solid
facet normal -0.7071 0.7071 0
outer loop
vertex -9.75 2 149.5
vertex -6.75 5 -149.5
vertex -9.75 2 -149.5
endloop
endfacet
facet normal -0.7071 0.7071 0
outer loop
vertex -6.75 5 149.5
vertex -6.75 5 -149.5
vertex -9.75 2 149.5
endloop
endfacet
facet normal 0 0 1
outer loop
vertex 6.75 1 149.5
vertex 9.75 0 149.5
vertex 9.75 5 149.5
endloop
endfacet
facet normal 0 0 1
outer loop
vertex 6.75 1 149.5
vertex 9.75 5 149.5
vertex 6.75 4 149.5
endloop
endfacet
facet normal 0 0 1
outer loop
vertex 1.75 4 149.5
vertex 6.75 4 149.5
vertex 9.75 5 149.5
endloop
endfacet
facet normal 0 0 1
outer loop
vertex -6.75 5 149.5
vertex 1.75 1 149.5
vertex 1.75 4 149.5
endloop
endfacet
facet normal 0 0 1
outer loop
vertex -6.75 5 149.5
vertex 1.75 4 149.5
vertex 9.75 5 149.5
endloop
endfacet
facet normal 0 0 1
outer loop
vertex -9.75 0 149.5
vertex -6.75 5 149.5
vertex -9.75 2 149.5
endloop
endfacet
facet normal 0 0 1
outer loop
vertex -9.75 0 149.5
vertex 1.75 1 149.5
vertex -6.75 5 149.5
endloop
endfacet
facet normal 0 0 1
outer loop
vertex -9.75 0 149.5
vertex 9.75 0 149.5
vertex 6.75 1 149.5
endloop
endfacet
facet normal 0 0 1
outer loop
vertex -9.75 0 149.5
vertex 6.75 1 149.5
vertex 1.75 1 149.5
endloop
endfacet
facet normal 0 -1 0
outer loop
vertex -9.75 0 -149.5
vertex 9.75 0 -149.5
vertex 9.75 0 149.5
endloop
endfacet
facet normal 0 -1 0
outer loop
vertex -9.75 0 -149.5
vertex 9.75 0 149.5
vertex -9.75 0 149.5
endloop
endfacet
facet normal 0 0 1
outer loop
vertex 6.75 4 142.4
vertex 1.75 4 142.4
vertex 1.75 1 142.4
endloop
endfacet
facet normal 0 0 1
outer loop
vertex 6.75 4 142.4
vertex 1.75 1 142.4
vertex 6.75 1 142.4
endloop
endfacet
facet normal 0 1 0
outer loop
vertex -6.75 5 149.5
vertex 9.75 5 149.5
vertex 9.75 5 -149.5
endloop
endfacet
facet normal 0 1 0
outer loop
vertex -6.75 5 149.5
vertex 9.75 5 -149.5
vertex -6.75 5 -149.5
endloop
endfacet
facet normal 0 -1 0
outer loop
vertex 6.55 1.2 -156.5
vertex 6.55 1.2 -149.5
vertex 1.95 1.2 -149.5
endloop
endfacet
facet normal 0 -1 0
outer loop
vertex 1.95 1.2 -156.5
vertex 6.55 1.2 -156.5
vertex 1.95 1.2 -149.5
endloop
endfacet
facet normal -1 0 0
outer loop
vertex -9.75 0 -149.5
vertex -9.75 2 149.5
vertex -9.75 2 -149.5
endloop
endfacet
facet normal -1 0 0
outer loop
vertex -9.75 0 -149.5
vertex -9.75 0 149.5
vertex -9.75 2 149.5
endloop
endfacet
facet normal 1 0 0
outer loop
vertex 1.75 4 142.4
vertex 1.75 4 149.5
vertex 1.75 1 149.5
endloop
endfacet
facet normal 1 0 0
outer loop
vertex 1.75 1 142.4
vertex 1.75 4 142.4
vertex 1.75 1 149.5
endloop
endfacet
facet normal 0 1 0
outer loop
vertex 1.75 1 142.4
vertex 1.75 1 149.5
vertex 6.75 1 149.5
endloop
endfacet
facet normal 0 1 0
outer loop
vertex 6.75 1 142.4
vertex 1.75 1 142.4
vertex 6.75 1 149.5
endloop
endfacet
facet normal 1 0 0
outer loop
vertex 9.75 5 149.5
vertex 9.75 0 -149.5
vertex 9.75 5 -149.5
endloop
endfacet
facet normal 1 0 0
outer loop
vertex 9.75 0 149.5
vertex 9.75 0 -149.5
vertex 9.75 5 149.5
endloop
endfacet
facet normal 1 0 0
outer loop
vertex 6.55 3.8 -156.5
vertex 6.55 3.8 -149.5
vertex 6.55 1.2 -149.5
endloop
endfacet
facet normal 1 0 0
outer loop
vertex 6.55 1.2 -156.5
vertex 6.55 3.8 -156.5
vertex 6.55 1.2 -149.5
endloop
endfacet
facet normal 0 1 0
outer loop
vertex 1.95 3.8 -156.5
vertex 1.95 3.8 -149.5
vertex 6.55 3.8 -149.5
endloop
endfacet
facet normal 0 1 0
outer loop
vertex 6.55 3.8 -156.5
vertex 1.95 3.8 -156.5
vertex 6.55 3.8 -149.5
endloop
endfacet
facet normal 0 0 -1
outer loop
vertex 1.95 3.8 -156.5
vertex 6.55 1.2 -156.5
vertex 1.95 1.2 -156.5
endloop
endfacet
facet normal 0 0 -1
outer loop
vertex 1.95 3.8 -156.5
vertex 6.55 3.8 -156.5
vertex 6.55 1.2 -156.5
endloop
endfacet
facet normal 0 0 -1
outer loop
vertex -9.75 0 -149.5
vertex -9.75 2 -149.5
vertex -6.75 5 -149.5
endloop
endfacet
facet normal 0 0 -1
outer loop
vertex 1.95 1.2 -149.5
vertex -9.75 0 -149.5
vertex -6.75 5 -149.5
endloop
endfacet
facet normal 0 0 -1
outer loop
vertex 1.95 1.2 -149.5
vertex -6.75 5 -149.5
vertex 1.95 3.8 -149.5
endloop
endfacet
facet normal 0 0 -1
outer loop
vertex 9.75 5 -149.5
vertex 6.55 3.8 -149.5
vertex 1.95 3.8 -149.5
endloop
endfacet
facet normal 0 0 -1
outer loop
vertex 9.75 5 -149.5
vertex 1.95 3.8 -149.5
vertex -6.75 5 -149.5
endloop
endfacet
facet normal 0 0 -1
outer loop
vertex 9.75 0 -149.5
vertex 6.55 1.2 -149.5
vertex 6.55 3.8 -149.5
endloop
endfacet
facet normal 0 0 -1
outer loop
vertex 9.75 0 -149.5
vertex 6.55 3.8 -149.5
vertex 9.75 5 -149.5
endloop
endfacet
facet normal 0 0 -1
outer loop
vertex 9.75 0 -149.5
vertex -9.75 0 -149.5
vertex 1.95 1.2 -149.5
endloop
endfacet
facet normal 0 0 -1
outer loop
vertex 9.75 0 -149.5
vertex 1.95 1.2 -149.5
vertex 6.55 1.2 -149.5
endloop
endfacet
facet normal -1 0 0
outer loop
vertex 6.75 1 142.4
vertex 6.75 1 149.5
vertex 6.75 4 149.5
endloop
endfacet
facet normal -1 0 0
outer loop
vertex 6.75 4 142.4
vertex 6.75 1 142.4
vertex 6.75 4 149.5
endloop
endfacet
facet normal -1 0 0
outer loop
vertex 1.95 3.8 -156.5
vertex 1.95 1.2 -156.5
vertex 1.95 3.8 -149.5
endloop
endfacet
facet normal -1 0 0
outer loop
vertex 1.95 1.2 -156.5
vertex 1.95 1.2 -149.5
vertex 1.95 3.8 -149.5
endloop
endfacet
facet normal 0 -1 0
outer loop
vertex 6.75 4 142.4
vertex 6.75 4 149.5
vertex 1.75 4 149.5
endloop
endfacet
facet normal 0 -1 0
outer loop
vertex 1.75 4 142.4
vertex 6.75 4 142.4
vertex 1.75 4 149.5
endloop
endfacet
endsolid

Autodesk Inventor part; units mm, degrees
ref_plane "YZ Plane" through (0, 0, 0) normal (1, 0, 0) x (0, 1, 0)
ref_plane "XZ Plane" through (0, 0, 0) normal (0, 1, 0) x (-1, 0, 0)
ref_plane "XY Plane" through (0, 0, 0) normal (0, 0, 1) x (1, 0, 0)
sketch "Sketch1" plane through (0, 0, 0) normal (0, 1, 0) x (-1, 0, 0)
  line L0 (-9.75, 149.5) -> (9.75, 149.5)
  line L1 (9.75, 149.5) -> (9.75, -149.5)
  line L2 (9.75, -149.5) -> (-9.75, -149.5)
  line L3 (-9.75, -149.5) -> (-9.75, 149.5)
  line L4 (-9.75, 149.5) -> (9.75, -149.5) construction
  line L5 (9.75, 149.5) -> (-9.75, -149.5) construction
  point P0 (0, 0)
  dimension "d0" = 19.5
  dimension "d1" = 299
extrude "Extrusion1" add sketch "Sketch1" along normal blind 5
chamfer "Chamfer1" distance 3 angle 45 1 edges at (-9.75, 5, 0)
sketch "Sketch2" plane through (-9.75, 0, 149.5) normal (0, 0, 1) x (1, 0, 0)
  line L0 (0, 2) -> (3, 5) projected
  line L1 (0, 0) -> (0, 2) projected
  line L2 (0, 0) -> (19.5, 0) projected
  line L3 (19.5, 0) -> (19.5, 5) projected
  line L4 (3, 5) -> (19.5, 5) projected
  line L5 (16.5, 4) -> (11.5, 4)
  line L6 (11.5, 4) -> (11.5, 1)
  line L7 (11.5, 1) -> (16.5, 1)
  line L8 (16.5, 1) -> (16.5, 4)
  line L9 (16.5, 4) -> (11.5, 1) construction
  line L10 (11.5, 4) -> (16.5, 1) construction
  point P0 (9.75, 0)
  point P1 (14, 2.5)
  point P2 (19.5, 2.5)
  dimension "d7" = 5
  dimension "d8" = 3
  dimension "d9" = 3
extrude "Extrusion2" cut sketch "Sketch2" against normal blind 7.1 contours L8 L7 L6 L5
sketch "Sketch3" plane through (9.75, 0, -149.5) normal (0, 0, -1) x (-1, 0, 0)
  line L0 (8, 1) -> (8, 4) projected
  line L1 (3, 1) -> (8, 1) projected
  line L2 (3, 4) -> (3, 1) projected
  line L3 (8, 4) -> (3, 4) projected
  line L4 (7.8, 1.2) -> (7.8, 3.8)
  line L5 (7.8, 3.8) -> (3.2, 3.8)
  line L6 (3.2, 3.8) -> (3.2, 1.2)
  line L7 (3.2, 1.2) -> (7.8, 1.2)
  point P0 (9.75, 0)
  dimension "d12" = 0.2
extrude "Extrusion3" add sketch "Sketch3" along normal blind 7 contours L7 L6 L5 L4
properties part number "SEPARADOR" material "Steel, Mild, Welded"
